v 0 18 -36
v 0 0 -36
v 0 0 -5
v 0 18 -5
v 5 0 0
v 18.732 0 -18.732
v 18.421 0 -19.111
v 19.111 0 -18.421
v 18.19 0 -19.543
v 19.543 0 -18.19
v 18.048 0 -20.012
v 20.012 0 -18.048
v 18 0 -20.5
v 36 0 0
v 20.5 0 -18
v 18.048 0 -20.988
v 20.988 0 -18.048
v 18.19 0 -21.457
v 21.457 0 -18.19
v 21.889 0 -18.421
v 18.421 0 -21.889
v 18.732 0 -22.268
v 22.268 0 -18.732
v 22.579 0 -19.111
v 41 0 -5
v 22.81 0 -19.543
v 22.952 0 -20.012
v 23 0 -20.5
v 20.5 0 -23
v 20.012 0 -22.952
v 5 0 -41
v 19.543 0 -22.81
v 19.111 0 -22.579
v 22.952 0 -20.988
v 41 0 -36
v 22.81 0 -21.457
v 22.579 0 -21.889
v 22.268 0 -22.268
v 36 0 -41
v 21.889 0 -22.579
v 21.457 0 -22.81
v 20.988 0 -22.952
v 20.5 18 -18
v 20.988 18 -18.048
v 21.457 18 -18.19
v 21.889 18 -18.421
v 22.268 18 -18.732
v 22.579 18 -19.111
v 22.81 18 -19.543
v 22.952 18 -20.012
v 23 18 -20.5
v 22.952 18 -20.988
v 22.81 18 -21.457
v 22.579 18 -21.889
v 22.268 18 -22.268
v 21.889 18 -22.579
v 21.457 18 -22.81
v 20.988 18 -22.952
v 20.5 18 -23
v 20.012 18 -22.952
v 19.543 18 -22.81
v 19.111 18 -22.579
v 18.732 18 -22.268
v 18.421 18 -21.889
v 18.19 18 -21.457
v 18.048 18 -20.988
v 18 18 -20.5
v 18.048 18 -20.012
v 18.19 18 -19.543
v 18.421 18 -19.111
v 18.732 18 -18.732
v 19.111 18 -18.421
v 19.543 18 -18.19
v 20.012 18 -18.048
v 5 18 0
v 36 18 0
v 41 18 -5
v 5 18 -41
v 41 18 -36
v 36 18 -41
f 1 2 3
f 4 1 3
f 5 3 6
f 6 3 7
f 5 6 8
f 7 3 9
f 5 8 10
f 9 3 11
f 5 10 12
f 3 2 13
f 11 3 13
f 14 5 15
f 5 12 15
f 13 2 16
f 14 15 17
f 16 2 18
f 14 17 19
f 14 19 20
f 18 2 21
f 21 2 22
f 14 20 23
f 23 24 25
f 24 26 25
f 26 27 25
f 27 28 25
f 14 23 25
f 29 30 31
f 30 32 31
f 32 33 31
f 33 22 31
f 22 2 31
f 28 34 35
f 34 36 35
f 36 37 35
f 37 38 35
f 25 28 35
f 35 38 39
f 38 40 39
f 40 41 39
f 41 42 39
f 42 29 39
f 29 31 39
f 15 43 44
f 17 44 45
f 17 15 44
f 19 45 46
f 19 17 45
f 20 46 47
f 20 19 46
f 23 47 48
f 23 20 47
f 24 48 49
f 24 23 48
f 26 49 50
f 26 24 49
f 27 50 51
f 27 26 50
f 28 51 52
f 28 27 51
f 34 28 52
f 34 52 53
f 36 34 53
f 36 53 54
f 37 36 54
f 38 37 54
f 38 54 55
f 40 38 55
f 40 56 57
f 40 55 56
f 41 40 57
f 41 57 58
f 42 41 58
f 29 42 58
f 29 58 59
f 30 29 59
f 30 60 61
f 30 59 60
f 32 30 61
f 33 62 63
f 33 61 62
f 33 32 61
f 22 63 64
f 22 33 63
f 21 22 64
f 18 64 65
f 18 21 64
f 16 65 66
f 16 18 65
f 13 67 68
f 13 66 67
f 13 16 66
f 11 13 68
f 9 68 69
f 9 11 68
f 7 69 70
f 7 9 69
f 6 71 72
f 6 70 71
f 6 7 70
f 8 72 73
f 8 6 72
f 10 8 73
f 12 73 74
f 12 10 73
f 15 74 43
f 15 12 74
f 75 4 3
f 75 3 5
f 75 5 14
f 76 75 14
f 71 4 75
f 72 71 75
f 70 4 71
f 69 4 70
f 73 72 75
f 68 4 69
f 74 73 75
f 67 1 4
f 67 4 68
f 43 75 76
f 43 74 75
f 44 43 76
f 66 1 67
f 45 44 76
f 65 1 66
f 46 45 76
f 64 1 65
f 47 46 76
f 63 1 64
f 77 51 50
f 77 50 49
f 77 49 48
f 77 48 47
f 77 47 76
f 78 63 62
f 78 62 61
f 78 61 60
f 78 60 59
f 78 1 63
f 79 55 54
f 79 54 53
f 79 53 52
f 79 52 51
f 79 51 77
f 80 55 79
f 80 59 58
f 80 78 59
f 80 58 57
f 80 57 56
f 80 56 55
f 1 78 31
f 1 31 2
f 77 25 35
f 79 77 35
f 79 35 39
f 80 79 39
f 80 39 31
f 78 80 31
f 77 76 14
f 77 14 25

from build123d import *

# Parameters (mm, degrees)
SKETCH1_R           = 2.5
BOSS_EXTRUDE1_DEPTH = 28
SKETCH2_W           = 46.067929507
SKETCH2_H           = 54.310700194
CUT_EXTRUDE1_DEPTH  = 10


with BuildPart() as part:
    # Sketch1 → Boss-Extrude1 (new body)
    with BuildSketch(Plane(origin=(0, 0, 0), x_dir=(1, 0, 0), z_dir=(0, 1, 0))):
        Polygon((5, 0), (36, 0), (41, 5), (41, 36), (36, 41), (5, 41), (0, 36), (0, 5), align=None)
        with Locations(Location((20.5, 20.5, 0), (0, 0, 270))):
            Circle(SKETCH1_R, mode=Mode.SUBTRACT)
    extrude(amount=BOSS_EXTRUDE1_DEPTH)

    # Sketch2 → Cut-Extrude1 (cut)
    with BuildSketch(Plane(origin=(0, 28, 0), x_dir=(1, 0, 0), z_dir=(0, 1, 0))):
        with Locations((20.912138535, 21.370070239)):
            Rectangle(SKETCH2_W, SKETCH2_H)
    extrude(amount=-CUT_EXTRUDE1_DEPTH, mode=Mode.SUBTRACT)


solid = part.part
